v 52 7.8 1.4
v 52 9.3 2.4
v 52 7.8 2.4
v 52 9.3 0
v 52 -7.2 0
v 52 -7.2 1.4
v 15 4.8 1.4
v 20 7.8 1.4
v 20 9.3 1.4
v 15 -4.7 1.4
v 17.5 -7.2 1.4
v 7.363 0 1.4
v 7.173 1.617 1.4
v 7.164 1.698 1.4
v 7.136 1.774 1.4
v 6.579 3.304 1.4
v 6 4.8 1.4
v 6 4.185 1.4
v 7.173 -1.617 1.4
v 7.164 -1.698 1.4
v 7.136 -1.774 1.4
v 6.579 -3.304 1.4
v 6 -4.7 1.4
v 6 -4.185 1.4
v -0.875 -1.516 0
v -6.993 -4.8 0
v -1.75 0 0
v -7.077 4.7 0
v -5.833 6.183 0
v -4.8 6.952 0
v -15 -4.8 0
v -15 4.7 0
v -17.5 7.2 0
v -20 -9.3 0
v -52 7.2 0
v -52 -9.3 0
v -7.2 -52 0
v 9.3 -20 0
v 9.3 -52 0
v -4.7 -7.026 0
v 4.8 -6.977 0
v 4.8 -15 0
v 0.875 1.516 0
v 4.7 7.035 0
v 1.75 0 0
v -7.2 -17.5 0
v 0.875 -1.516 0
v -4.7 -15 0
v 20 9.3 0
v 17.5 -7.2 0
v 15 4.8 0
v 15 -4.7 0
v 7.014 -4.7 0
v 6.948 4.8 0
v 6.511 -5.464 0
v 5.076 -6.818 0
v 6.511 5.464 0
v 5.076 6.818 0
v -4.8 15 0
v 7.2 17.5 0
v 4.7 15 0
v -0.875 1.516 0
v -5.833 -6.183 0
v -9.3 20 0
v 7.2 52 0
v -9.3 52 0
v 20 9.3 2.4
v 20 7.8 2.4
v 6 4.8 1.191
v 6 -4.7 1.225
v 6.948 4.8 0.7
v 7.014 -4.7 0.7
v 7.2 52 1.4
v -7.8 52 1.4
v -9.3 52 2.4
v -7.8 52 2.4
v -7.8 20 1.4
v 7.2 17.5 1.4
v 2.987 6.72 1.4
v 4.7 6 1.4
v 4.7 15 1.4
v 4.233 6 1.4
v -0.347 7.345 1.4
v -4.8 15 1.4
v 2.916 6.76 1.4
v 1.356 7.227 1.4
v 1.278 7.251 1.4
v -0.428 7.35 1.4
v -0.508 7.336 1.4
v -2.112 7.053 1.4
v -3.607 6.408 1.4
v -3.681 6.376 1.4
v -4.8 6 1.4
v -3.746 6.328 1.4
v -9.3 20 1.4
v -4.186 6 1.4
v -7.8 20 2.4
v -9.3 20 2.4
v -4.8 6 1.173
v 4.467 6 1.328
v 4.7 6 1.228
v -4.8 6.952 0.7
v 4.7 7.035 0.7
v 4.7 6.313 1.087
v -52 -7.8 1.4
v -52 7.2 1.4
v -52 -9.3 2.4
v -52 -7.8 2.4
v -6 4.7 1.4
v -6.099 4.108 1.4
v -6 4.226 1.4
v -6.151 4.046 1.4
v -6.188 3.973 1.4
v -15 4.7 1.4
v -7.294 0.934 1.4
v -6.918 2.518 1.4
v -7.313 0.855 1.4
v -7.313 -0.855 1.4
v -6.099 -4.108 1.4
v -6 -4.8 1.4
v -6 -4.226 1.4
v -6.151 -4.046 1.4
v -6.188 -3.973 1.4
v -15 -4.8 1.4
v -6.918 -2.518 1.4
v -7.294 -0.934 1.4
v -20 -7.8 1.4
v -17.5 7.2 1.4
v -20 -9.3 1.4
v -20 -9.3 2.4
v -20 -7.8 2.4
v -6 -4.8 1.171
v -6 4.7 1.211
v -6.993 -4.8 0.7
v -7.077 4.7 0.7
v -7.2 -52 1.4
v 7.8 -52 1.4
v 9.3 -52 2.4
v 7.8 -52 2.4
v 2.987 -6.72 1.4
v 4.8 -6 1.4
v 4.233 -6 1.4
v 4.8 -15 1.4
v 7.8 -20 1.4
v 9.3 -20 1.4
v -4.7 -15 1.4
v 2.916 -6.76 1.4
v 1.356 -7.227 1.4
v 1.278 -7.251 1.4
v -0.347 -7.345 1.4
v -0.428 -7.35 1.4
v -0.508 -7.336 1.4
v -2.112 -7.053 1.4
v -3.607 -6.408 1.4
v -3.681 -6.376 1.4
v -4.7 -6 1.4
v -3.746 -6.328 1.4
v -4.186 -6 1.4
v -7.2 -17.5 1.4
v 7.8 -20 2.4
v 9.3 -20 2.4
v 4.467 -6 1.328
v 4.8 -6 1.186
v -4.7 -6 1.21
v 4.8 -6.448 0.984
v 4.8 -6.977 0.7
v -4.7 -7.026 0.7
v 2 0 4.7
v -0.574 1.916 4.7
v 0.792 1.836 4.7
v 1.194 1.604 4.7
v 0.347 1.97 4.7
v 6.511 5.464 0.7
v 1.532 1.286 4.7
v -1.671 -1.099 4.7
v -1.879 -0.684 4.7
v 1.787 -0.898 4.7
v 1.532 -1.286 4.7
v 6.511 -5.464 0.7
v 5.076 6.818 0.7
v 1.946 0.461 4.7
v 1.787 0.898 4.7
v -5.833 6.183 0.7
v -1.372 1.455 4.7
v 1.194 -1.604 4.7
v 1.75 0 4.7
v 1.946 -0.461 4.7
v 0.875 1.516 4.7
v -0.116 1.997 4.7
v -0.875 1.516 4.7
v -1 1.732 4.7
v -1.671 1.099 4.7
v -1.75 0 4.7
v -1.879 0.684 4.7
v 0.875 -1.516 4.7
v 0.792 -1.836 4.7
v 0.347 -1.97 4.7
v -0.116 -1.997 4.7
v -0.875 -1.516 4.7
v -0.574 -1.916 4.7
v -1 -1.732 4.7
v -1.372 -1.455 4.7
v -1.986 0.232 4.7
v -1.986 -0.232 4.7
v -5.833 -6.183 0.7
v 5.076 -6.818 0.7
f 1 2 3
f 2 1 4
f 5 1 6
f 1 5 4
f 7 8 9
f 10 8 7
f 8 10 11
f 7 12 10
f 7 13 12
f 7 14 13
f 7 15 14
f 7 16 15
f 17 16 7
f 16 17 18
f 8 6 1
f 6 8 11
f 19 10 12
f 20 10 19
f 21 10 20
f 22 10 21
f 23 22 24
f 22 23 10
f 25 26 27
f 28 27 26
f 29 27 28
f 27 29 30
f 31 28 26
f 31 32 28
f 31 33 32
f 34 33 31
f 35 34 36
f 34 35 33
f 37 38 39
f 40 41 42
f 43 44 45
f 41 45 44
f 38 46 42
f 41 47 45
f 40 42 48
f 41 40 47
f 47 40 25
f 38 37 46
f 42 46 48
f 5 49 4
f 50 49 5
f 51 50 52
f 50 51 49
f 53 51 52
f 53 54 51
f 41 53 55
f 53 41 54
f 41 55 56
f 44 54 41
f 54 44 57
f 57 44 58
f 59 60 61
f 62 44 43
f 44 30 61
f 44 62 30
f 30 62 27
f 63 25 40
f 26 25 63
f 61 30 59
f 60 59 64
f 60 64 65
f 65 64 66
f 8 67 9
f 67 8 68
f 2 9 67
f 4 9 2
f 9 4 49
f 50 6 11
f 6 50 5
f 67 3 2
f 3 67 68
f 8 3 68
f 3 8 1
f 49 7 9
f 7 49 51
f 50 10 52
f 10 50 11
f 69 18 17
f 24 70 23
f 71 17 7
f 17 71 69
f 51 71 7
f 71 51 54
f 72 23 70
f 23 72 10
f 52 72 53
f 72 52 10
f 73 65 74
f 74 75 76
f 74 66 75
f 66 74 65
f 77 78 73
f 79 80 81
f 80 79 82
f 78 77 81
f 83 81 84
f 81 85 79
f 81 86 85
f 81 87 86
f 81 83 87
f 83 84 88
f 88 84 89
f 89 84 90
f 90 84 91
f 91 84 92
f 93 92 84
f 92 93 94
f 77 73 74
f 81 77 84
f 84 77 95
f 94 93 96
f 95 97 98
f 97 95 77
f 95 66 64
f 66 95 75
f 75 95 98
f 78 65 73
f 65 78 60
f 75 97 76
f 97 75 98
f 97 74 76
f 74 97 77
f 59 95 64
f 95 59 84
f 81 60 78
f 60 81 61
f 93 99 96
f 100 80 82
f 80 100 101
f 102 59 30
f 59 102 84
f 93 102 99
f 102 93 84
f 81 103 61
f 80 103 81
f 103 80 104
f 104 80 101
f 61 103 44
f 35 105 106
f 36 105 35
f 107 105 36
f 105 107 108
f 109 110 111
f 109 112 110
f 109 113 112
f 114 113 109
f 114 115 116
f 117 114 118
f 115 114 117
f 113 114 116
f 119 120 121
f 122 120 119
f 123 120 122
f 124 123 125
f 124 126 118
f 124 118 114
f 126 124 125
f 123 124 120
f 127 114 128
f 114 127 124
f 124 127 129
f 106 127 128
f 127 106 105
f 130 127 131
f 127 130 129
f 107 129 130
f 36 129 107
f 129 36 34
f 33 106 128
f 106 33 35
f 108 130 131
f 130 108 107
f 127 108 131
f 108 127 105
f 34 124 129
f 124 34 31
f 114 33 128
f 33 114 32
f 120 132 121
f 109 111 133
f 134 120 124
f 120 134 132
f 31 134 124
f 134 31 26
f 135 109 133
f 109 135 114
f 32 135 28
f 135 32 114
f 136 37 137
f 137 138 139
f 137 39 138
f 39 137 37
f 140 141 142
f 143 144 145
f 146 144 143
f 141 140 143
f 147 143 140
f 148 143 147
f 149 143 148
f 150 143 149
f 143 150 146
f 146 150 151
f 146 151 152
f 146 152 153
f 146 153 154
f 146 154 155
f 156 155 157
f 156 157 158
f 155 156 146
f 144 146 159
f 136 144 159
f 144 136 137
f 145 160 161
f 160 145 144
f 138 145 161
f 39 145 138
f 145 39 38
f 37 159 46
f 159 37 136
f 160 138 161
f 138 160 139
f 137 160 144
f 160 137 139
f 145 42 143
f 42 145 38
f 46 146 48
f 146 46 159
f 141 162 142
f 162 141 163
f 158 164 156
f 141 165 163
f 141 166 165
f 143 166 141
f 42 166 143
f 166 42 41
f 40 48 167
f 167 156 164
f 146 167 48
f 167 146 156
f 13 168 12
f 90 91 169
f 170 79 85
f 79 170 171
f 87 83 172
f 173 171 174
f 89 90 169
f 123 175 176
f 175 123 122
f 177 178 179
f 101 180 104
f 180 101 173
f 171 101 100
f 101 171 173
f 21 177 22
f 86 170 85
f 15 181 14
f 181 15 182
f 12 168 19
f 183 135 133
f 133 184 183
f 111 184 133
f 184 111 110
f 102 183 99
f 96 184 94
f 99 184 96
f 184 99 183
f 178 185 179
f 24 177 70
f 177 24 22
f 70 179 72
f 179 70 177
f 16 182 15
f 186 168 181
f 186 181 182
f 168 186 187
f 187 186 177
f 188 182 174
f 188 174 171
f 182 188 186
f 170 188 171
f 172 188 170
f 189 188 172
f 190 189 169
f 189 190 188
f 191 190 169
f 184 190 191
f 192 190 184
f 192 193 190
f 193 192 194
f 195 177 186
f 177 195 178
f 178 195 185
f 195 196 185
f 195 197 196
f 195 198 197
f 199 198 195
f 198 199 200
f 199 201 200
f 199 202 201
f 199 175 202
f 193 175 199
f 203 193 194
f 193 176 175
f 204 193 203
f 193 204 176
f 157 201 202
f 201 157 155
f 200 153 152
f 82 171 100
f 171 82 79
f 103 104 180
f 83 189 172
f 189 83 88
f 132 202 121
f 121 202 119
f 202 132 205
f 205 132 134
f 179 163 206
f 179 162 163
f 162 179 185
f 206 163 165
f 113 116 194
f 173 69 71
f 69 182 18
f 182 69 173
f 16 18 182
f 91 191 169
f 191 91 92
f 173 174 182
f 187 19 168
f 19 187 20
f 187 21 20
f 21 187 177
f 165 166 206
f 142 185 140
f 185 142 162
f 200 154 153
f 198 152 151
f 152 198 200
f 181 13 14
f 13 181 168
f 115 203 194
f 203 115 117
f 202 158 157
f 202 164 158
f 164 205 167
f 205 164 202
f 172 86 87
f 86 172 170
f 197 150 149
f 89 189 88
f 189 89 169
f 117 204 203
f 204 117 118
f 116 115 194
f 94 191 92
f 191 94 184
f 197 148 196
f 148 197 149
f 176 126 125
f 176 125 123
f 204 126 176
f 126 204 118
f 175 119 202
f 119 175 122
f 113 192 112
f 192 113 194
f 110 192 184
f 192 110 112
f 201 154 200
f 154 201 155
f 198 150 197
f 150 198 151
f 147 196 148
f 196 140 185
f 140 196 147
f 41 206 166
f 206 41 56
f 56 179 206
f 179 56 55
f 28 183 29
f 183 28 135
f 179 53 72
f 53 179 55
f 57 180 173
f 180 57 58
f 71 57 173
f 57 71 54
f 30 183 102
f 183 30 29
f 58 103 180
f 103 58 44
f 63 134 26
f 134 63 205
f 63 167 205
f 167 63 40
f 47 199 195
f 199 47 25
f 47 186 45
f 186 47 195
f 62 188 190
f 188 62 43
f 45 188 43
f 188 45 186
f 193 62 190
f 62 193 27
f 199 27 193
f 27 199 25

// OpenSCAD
d=2.5+1;
h=1.4;

module fin() {
  translate([8, -7.2, 0]) {
    translate([7, 0, 0]) {
      hull() {
        translate([0, 2.5, 0])
          cube([0.01,9.5, h]);
        translate([5, 0, 0])
          cube([0.01,16.5, h]);
        translate([2.5, 0, 0])
          cube([0.01, 8, h]);
      }
      translate([5, 0, 0]) {
        cube([32, 16.5, h]);
        translate([0, 16.5-1.5, h]) 
          cube([32, 1.5, 1]);
      }
    }
    translate([-2, 2.5, 0])
      cube([9,9.5, h]);
  }
}

difference() {
  union() {
    for (a = [0 : 90 : 360])
      rotate([0, 0, a])
        fin();
    translate([0, 0, h*0.5])
      cylinder(r1=8.5, r2=2, h=4, $n=60);
    cylinder(r1=8.5, r2=8.5, h=h*0.5, $n=60);
  }
  cylinder(r1=d/2, r2=d/2, h=10, $n=40, center=true);
}
